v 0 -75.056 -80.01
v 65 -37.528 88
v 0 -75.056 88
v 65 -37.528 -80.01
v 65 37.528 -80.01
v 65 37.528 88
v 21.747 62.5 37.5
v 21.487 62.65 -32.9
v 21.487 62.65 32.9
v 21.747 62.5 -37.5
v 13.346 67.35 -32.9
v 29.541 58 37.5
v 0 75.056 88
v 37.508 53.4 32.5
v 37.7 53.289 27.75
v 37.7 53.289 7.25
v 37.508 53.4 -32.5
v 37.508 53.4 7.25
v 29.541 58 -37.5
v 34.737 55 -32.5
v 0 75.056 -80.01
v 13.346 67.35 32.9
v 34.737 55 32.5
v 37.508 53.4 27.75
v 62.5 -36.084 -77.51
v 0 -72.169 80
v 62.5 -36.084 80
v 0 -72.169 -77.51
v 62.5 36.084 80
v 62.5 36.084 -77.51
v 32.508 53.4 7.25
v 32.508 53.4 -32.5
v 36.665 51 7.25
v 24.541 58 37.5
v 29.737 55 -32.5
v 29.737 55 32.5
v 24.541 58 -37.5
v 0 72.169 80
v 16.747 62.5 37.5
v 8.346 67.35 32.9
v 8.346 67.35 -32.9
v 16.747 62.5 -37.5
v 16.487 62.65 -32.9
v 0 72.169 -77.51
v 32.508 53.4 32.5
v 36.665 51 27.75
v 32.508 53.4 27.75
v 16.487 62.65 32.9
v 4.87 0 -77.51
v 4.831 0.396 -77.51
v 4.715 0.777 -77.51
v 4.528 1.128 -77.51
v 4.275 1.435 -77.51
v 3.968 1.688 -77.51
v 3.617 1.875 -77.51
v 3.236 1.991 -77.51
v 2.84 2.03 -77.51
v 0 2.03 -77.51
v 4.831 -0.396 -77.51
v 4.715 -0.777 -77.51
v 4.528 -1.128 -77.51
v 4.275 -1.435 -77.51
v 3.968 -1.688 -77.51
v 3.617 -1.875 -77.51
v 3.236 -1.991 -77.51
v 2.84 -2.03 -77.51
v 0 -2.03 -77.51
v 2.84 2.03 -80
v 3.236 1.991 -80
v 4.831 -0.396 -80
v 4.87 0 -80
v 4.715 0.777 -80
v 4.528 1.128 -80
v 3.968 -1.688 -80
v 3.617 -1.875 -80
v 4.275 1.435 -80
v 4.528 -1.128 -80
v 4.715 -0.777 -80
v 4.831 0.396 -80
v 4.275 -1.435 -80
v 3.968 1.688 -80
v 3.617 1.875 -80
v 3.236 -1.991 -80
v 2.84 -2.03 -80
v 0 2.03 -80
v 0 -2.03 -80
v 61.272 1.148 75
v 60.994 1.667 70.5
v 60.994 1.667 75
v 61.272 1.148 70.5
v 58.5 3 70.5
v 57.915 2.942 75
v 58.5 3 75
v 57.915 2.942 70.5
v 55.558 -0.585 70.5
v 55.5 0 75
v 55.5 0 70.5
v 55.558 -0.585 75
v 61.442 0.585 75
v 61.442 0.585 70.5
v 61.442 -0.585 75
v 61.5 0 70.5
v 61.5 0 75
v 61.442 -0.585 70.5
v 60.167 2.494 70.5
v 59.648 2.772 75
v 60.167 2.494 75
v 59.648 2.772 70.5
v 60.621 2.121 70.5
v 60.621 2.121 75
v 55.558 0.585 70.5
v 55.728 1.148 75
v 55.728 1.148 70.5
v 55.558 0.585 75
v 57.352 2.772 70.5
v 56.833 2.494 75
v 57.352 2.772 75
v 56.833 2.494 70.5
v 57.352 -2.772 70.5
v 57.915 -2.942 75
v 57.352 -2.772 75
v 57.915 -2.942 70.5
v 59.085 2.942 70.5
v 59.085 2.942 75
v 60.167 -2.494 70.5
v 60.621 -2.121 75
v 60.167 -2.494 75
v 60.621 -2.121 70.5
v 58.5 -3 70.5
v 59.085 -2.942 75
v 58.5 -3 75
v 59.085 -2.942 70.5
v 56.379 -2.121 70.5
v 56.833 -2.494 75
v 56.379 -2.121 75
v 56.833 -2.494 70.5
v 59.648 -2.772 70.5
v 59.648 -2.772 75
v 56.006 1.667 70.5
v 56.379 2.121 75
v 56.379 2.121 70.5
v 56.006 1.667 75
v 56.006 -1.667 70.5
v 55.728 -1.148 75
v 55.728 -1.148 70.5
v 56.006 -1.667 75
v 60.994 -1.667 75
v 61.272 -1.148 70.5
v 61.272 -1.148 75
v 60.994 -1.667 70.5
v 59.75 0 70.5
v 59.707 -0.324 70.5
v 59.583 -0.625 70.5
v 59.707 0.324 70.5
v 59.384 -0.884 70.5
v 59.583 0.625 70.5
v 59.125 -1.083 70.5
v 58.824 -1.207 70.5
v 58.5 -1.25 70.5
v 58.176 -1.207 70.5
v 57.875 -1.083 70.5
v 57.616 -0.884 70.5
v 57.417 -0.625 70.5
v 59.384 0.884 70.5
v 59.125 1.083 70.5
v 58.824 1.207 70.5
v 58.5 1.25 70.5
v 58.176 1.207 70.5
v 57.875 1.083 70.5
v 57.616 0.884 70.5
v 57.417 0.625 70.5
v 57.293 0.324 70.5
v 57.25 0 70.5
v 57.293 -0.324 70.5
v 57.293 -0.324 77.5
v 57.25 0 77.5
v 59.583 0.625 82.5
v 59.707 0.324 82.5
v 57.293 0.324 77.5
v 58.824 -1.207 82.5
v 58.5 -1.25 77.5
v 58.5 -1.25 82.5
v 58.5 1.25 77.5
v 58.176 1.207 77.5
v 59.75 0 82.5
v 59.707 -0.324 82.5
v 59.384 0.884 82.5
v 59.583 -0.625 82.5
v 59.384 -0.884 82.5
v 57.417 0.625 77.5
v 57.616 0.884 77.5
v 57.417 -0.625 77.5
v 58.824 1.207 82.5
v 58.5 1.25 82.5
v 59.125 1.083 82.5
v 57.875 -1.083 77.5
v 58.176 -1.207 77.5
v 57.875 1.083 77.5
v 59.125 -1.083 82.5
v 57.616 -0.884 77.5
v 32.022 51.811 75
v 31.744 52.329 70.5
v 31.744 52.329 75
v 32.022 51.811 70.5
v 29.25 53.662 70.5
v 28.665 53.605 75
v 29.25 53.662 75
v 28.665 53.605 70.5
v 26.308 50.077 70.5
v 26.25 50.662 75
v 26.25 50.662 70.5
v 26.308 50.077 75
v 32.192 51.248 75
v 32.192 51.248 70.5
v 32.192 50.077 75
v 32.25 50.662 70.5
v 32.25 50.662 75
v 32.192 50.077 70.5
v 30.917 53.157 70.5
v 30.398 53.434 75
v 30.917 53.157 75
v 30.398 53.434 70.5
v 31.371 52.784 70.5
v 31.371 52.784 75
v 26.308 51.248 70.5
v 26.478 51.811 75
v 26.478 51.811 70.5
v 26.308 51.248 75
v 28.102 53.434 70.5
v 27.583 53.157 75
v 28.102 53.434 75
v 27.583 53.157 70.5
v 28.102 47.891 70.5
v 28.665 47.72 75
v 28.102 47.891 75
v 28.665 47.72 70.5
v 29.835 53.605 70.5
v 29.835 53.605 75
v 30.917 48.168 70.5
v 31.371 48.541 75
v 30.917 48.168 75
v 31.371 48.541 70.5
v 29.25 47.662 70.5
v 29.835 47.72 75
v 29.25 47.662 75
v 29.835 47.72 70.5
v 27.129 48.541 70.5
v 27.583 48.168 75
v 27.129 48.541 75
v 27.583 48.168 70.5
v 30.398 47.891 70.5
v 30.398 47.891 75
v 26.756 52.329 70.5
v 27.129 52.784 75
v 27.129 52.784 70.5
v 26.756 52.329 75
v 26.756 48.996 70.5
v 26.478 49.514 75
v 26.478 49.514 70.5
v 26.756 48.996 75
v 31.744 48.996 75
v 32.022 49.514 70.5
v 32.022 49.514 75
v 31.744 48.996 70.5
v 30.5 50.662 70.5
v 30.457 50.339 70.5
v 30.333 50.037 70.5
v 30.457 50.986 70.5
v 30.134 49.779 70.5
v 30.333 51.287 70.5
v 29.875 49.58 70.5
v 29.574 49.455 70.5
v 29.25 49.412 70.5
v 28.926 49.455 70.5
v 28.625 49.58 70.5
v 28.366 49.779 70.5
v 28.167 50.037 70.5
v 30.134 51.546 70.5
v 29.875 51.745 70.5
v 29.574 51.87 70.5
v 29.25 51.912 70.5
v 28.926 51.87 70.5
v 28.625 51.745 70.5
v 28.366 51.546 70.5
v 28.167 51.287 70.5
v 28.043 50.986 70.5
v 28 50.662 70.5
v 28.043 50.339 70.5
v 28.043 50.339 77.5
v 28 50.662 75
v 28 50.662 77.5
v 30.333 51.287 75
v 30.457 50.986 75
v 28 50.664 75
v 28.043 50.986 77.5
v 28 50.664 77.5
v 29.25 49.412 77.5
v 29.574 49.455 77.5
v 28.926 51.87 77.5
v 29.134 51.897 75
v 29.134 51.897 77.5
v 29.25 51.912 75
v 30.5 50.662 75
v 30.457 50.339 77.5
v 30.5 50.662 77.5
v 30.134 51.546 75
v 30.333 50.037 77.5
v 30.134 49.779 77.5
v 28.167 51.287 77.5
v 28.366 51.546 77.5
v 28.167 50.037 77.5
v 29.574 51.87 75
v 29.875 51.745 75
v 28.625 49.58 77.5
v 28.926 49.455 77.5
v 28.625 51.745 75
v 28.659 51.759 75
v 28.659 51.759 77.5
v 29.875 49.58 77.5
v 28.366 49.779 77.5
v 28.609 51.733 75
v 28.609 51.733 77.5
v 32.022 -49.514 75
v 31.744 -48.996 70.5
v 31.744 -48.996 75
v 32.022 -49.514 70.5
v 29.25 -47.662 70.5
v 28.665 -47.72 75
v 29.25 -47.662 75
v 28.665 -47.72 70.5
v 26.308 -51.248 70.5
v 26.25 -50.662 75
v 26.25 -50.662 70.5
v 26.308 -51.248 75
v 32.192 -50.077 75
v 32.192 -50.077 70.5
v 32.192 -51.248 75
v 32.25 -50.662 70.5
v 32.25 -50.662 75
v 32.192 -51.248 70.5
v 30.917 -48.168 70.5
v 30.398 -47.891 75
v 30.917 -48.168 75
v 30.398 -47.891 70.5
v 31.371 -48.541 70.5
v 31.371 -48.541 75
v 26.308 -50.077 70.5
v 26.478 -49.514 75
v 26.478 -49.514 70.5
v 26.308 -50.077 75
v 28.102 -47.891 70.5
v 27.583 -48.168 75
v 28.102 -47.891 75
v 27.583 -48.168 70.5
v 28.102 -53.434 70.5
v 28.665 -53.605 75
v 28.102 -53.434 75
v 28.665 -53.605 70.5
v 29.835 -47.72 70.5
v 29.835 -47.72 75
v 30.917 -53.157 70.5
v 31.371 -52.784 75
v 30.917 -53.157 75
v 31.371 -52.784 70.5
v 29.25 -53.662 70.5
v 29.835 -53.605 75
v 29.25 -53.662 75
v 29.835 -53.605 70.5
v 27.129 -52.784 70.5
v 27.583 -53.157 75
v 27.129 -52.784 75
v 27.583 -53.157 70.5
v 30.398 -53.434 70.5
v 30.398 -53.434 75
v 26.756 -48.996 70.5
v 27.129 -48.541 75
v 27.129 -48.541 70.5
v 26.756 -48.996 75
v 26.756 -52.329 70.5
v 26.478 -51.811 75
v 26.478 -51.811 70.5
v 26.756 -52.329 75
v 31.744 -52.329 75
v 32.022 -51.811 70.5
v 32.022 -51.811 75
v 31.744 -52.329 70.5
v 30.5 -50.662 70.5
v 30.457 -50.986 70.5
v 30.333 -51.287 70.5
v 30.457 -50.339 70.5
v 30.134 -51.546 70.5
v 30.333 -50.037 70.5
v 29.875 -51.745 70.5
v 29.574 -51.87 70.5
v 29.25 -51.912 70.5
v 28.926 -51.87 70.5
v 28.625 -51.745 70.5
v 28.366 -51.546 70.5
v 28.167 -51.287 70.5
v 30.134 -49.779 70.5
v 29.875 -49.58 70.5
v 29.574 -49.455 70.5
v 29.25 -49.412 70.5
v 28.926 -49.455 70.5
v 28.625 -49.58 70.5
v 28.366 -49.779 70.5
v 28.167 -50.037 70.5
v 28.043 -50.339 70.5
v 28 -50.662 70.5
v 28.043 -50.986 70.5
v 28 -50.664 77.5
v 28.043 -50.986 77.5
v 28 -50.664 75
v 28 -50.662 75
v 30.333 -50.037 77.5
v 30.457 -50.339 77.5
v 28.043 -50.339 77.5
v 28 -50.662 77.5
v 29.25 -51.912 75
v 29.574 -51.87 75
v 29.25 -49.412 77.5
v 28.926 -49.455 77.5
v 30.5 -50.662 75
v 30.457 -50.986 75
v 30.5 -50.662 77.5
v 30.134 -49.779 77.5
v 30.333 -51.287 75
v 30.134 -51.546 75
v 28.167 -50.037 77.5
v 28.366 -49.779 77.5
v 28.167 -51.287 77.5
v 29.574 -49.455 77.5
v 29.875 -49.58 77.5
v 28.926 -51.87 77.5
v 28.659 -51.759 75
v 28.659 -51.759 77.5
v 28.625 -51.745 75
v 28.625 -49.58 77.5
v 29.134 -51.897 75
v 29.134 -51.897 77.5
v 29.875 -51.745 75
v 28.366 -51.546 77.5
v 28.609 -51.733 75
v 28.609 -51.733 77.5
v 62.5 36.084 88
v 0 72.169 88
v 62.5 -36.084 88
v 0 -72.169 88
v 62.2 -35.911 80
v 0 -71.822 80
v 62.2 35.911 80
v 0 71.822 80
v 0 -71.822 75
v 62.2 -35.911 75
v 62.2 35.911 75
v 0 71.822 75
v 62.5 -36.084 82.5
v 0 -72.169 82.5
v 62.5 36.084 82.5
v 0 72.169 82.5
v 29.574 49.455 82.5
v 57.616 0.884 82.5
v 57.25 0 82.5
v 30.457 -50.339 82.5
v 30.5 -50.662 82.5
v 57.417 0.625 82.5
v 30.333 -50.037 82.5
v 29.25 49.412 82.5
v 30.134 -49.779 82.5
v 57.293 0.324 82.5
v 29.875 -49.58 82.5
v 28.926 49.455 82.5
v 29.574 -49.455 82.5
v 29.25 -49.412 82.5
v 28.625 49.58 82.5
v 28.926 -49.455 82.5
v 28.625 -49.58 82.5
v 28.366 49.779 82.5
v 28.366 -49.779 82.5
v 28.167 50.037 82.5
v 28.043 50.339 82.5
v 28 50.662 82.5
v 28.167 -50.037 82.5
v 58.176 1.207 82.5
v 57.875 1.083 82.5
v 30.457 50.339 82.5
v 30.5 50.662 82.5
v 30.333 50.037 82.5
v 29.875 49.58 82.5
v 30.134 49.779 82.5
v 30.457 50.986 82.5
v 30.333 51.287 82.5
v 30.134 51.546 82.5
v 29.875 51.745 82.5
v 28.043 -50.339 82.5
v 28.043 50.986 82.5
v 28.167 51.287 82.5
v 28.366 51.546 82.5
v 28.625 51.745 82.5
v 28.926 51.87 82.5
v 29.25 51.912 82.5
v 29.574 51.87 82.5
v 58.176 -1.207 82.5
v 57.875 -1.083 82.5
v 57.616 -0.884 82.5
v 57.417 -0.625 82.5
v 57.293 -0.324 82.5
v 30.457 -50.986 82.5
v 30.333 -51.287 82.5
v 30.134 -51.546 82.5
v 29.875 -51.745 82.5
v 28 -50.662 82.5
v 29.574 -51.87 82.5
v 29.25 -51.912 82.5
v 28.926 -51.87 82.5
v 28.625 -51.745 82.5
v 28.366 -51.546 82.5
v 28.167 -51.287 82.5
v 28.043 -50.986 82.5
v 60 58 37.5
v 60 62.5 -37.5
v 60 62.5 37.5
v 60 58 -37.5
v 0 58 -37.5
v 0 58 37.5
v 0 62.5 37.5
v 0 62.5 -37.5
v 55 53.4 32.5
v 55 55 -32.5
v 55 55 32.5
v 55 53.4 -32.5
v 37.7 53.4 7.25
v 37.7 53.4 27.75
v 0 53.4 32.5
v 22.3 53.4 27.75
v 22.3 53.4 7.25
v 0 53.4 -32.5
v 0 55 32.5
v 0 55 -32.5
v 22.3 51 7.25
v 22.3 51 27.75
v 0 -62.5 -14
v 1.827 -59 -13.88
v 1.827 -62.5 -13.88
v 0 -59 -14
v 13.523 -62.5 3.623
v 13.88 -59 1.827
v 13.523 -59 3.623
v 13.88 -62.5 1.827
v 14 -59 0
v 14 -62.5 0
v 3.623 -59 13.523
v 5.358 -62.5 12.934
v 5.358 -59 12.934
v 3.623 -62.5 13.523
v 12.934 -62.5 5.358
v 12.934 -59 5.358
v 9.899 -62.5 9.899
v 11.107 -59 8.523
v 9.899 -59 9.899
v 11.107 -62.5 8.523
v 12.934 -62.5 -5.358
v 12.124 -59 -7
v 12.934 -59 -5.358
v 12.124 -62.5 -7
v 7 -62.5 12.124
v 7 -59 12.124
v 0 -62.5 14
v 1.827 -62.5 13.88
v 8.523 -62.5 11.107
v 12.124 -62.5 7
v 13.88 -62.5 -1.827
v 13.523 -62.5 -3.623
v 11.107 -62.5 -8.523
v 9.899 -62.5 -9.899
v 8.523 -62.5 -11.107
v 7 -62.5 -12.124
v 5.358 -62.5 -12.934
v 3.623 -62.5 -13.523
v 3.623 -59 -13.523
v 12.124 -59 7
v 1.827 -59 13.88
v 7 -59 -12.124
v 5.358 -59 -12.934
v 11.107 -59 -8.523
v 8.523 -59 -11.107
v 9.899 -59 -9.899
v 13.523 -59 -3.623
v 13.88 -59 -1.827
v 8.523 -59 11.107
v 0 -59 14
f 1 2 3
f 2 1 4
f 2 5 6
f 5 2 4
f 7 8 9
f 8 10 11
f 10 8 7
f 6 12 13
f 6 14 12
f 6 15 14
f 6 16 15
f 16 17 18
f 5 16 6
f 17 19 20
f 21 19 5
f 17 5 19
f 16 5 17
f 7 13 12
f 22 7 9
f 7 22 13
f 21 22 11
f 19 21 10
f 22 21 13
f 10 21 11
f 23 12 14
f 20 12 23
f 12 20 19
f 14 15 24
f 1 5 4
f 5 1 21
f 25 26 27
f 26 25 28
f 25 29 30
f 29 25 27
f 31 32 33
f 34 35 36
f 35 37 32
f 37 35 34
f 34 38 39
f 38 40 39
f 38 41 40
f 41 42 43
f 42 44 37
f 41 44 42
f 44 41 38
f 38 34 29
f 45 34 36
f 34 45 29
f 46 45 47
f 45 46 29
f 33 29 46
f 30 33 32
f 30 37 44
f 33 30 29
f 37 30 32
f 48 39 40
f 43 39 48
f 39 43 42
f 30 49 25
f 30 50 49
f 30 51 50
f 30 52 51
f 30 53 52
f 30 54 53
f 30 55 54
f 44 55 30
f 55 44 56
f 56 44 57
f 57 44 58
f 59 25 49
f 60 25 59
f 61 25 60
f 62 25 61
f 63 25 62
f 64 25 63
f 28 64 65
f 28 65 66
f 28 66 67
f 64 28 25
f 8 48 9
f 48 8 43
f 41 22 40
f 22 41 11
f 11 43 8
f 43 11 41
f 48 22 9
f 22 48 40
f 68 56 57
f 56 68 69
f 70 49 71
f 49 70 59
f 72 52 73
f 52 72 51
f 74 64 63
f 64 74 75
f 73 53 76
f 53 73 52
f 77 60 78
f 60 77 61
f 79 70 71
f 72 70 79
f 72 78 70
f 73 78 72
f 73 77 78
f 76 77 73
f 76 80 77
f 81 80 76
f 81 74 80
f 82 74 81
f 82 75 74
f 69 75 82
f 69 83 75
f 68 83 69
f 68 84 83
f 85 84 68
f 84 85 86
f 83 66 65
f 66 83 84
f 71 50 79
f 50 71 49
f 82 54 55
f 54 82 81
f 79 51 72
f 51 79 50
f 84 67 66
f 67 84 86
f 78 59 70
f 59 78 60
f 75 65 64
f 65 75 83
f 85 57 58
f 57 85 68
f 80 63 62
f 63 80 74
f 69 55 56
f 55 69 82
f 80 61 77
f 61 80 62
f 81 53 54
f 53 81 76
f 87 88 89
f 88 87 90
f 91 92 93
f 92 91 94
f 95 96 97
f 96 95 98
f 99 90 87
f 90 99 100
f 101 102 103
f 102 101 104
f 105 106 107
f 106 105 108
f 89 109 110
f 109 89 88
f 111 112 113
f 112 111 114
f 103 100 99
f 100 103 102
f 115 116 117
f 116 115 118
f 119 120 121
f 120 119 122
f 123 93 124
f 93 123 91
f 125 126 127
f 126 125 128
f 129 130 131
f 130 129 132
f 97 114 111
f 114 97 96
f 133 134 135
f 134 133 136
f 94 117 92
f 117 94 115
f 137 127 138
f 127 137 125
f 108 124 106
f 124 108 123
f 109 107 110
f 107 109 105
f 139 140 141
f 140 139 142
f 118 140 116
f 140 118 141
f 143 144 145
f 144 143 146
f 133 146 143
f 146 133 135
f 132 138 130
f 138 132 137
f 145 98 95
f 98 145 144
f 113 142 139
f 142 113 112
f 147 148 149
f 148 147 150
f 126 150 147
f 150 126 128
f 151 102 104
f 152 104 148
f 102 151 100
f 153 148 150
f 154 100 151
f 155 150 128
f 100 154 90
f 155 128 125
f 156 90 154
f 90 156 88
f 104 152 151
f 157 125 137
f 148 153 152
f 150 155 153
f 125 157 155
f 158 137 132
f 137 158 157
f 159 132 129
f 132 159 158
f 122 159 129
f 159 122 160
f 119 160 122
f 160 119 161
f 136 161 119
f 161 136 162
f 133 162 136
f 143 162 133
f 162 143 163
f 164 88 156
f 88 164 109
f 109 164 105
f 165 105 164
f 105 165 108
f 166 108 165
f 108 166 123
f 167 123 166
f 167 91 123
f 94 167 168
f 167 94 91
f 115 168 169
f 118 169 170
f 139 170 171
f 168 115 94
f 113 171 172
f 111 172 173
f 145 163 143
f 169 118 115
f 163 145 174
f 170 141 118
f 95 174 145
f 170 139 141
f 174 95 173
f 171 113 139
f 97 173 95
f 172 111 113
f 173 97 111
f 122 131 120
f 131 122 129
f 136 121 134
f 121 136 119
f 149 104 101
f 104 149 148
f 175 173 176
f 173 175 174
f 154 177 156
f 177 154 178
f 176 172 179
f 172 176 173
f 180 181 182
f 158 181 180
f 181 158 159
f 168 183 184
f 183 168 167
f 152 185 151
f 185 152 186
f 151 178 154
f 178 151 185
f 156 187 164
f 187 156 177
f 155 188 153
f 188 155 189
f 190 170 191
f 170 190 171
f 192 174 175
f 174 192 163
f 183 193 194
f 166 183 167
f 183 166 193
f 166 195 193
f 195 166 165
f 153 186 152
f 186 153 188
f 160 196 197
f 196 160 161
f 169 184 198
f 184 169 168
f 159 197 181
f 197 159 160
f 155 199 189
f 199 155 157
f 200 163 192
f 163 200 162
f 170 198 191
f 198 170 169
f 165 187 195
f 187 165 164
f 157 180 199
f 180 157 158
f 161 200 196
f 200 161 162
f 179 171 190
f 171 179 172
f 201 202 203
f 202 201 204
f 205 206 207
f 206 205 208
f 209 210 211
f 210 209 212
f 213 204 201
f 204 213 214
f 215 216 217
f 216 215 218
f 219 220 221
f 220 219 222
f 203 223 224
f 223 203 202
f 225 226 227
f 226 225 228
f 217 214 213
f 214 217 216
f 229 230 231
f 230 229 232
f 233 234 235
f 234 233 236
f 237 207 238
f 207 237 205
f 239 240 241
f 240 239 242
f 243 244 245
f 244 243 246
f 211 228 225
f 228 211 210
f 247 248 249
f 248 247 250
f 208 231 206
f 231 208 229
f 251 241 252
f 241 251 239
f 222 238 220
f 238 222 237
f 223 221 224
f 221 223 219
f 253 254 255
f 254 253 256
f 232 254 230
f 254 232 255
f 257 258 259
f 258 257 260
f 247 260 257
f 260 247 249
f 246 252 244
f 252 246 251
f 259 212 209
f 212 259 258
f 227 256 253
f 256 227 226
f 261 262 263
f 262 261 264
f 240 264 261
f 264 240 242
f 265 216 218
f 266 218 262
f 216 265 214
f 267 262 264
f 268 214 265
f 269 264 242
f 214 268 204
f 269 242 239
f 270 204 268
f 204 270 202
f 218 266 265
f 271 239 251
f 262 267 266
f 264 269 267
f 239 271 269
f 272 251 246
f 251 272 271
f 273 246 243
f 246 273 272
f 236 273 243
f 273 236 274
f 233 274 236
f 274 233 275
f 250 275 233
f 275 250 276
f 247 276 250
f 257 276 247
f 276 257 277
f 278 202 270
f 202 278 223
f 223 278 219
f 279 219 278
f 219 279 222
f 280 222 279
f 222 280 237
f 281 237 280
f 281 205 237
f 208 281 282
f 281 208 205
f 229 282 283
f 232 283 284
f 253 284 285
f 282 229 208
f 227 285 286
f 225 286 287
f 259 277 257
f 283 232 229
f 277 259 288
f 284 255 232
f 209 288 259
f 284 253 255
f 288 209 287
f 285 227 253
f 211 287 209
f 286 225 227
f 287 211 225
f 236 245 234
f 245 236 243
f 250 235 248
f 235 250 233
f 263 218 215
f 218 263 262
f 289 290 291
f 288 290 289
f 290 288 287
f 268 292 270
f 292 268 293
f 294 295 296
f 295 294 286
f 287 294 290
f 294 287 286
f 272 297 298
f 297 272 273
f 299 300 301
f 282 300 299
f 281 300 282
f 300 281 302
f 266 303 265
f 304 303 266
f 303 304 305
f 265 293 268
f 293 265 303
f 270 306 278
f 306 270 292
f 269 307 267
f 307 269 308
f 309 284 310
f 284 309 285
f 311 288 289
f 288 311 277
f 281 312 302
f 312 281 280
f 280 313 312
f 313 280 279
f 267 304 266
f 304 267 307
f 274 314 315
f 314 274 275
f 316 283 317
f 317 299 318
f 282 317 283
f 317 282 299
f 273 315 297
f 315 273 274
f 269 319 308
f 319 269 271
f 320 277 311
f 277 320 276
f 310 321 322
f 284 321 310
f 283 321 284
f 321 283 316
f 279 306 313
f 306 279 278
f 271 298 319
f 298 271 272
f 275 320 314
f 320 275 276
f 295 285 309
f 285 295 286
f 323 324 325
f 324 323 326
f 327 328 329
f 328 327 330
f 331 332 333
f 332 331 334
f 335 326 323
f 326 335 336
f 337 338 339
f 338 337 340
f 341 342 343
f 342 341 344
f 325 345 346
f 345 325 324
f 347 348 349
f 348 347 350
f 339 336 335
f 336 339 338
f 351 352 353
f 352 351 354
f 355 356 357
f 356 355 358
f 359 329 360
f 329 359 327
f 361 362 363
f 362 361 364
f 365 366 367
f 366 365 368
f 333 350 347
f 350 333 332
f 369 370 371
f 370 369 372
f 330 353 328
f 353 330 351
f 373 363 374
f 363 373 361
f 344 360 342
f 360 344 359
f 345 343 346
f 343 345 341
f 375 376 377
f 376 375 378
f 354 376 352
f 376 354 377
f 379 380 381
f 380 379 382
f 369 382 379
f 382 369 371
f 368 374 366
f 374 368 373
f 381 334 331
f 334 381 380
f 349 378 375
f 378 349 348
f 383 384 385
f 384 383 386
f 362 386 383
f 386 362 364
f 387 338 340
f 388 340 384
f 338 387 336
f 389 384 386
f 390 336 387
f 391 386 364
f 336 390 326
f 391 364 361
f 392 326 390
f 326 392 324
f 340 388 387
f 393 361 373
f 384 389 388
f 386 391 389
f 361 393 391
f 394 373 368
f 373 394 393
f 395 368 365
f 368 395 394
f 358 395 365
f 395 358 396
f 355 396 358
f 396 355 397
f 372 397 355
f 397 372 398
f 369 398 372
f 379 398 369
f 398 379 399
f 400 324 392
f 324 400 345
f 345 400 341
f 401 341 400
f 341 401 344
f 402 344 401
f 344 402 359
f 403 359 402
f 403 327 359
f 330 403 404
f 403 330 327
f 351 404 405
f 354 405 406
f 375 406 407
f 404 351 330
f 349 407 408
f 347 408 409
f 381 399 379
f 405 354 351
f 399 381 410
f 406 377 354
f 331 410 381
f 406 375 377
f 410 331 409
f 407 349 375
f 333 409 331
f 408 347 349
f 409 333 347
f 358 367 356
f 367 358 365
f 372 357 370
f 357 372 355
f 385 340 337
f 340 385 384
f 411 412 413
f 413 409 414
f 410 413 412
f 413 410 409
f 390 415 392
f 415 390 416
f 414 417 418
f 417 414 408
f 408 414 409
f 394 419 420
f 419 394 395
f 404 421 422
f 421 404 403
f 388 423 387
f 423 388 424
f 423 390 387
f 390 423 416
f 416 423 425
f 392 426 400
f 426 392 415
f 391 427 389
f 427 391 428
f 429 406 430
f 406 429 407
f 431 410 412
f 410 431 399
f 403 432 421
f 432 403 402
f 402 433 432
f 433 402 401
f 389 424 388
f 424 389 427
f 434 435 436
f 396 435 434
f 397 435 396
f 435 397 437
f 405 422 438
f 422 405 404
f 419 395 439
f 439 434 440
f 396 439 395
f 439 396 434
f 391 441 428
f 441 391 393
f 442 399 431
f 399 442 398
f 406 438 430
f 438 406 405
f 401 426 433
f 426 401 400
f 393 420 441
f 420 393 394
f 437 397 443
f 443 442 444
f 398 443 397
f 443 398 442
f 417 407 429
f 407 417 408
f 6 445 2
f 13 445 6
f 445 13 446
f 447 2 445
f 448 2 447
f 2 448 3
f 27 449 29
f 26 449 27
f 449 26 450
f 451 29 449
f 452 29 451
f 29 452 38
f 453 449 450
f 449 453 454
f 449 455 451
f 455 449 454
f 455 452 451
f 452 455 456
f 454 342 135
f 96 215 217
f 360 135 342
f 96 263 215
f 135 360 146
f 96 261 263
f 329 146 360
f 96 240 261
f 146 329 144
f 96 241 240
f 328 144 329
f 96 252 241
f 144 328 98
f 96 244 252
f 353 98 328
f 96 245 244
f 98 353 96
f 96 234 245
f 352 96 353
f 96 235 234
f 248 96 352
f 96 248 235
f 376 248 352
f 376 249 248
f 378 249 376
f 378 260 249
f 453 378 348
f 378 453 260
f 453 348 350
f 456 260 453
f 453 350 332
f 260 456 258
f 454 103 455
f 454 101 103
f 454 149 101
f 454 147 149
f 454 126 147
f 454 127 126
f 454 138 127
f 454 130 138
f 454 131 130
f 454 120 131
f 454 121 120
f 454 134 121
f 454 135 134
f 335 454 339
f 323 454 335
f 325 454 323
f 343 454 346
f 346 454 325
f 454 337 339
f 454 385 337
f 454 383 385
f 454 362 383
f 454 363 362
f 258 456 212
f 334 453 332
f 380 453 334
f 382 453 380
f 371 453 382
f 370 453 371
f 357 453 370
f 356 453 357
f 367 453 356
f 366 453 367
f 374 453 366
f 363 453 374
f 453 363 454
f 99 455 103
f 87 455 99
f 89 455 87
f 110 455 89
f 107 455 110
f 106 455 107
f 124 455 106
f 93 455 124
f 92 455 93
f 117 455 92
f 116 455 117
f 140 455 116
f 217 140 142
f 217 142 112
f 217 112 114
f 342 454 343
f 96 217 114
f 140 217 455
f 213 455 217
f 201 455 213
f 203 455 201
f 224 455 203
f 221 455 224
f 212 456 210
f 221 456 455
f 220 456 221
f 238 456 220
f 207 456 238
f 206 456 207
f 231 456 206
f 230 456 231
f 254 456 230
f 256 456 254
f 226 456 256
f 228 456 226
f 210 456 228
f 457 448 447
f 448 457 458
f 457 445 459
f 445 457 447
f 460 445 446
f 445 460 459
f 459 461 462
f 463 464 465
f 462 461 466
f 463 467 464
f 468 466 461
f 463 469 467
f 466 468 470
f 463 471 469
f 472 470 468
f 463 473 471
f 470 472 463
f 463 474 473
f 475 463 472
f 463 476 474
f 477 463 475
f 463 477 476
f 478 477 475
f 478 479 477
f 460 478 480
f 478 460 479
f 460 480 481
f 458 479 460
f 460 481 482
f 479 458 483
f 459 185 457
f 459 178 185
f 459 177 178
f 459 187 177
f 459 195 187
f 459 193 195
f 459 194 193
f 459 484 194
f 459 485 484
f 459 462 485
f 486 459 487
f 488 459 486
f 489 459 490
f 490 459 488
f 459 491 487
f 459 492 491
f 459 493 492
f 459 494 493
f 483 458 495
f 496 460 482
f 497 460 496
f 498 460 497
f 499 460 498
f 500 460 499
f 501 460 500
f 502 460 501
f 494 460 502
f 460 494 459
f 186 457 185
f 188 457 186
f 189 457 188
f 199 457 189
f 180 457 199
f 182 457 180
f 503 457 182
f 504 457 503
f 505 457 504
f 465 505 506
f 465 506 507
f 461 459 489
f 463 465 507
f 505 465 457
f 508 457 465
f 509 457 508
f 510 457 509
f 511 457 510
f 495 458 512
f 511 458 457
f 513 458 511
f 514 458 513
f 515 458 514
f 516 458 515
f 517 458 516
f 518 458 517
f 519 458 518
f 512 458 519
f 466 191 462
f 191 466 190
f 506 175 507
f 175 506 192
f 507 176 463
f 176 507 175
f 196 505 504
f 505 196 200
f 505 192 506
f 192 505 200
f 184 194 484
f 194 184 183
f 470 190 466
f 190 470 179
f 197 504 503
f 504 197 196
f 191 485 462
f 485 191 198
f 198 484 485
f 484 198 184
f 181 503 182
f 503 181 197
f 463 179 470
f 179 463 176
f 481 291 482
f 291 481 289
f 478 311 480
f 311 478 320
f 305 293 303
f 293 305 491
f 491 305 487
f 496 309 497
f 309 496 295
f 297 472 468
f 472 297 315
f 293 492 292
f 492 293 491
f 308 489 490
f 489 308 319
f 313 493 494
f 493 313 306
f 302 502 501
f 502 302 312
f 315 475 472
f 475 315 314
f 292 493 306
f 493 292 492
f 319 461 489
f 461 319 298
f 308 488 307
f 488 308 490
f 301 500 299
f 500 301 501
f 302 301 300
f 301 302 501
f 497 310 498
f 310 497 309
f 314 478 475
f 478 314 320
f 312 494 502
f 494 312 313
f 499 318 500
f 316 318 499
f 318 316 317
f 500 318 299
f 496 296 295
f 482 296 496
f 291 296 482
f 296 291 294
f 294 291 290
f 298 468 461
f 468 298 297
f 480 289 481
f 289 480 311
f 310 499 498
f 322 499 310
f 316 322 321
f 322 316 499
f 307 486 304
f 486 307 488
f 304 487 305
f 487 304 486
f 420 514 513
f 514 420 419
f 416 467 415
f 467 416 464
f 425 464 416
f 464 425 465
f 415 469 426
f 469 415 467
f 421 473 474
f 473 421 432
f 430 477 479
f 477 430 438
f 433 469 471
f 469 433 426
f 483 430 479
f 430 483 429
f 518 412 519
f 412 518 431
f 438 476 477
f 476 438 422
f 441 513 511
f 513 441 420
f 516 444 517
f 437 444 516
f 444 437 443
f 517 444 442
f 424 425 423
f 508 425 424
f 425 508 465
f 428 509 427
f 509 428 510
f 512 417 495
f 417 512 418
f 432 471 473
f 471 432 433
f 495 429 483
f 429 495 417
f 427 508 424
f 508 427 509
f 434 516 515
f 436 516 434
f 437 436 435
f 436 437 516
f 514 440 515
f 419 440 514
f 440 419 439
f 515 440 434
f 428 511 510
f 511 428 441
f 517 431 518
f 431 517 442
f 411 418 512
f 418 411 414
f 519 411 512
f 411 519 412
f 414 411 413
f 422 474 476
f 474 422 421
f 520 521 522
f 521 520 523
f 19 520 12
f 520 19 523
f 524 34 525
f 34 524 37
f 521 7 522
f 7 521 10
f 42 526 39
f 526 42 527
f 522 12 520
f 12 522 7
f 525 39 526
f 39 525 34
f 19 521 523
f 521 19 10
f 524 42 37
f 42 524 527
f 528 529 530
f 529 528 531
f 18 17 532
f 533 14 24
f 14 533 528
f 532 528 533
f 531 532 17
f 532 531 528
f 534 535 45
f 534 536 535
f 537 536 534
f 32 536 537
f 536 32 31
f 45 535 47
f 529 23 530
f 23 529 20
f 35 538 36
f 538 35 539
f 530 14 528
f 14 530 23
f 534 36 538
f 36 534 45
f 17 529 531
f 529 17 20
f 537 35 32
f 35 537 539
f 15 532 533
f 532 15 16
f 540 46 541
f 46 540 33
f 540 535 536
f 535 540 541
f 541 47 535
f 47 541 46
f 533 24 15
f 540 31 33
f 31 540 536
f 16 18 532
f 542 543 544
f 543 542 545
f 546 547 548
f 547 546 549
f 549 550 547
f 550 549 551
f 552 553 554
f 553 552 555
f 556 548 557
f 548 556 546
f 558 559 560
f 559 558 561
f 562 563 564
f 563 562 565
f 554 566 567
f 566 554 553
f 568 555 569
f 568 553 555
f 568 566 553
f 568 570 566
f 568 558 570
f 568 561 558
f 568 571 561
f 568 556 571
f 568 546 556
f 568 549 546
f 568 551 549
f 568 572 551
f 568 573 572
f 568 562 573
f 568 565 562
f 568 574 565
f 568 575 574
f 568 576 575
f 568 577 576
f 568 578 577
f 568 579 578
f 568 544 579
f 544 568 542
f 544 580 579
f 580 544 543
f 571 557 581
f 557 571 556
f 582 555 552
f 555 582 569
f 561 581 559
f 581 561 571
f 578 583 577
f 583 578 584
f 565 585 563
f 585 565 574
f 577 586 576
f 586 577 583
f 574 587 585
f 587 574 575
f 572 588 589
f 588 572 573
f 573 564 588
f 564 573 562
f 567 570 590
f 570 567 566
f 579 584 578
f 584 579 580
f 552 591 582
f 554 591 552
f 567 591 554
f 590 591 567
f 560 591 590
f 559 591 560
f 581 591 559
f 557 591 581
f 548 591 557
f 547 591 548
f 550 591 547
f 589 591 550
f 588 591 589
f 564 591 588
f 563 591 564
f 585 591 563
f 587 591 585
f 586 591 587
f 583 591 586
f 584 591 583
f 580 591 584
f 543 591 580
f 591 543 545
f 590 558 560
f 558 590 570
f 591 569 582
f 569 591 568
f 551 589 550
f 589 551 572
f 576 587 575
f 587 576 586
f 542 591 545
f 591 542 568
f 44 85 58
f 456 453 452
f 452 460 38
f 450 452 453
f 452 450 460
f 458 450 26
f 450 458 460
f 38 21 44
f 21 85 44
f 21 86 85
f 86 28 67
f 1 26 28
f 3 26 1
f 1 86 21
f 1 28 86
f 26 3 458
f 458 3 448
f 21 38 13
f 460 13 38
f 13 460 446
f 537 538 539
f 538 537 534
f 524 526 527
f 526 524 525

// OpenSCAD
intersection() {
	union() {
		color(alpha = 0.9, c = "SlateGray") {
			union() {
				difference() {
					difference() {
						difference() {
							difference() {
								difference() {
									rotate(a = [0, 0, 30]) {
										cylinder($fn = 6, center = true, d = 150.1110699893027, h = 160.02);
									}
									translate(v = [0, 0, 1.25]) {
										rotate(a = [0, 0, 30]) {
											cylinder($fn = 6, center = true, d = 144.33756729740645, h = 157.52);
										}
									}
								}
								translate(v = [0, 0, 0.0]) {
									rotate(a = [0, 0, 0.0]) {
										translate(v = [0, 65.0, 0]) {
											rotate(a = [90, 0, 0]) {
												cube(center = true, size = [109.0, 65.8, 4.7]);
											}
										}
									}
								}
							}
							union() {
								translate(v = [0, 0, -15.0]) {
									rotate(a = [0, 0, -60.0]) {
										translate(v = [0, 65.0, 0]) {
											rotate(a = [90, 0, 0]) {
												cylinder($fn = 32, center = true, d = 8.0, h = 4.7);
											}
										}
									}
								}
								translate(v = [0, 0, 0.0]) {
									rotate(a = [0, 0, -60.0]) {
										translate(v = [0, 65.0, 0]) {
											rotate(a = [90, 0, 0]) {
												cylinder($fn = 32, center = true, d = 8.0, h = 4.7);
											}
										}
									}
								}
								translate(v = [0, 0, 15.0]) {
									rotate(a = [0, 0, -60.0]) {
										translate(v = [0, 65.0, 0]) {
											rotate(a = [90, 0, 0]) {
												cylinder($fn = 32, center = true, d = 8.0, h = 4.7);
											}
										}
									}
								}
							}
						}
						rotate(a = [0, 0, 120.0]) {
							translate(v = [0, 65.0, 0]) {
								rotate(a = [90, 0, 0]) {
									translate(v = [0, 0, 0]) {
										union() {
											translate(v = [-8.0, -16.0, 0]) {
												cylinder($fn = 16, center = true, d = 2.0, h = 20);
											}
											translate(v = [-4.0, -16.0, 0]) {
												cylinder($fn = 16, center = true, d = 2.0, h = 20);
											}
											translate(v = [0.0, -16.0, 0]) {
												cylinder($fn = 16, center = true, d = 2.0, h = 20);
											}
											translate(v = [4.0, -16.0, 0]) {
												cylinder($fn = 16, center = true, d = 2.0, h = 20);
											}
											translate(v = [8.0, -16.0, 0]) {
												cylinder($fn = 16, center = true, d = 2.0, h = 20);
											}
											translate(v = [-12.0, -12.0, 0]) {
												cylinder($fn = 16, center = true, d = 2.0, h = 20);
											}
											translate(v = [-8.0, -12.0, 0]) {
												cylinder($fn = 16, center = true, d = 2.0, h = 20);
											}
											translate(v = [-4.0, -12.0, 0]) {
												cylinder($fn = 16, center = true, d = 2.0, h = 20);
											}
											translate(v = [0.0, -12.0, 0]) {
												cylinder($fn = 16, center = true, d = 2.0, h = 20);
											}
											translate(v = [4.0, -12.0, 0]) {
												cylinder($fn = 16, center = true, d = 2.0, h = 20);
											}
											translate(v = [8.0, -12.0, 0]) {
												cylinder($fn = 16, center = true, d = 2.0, h = 20);
											}
											translate(v = [12.0, -12.0, 0]) {
												cylinder($fn = 16, center = true, d = 2.0, h = 20);
											}
											translate(v = [-16.0, -8.0, 0]) {
												cylinder($fn = 16, center = true, d = 2.0, h = 20);
											}
											translate(v = [-12.0, -8.0, 0]) {
												cylinder($fn = 16, center = true, d = 2.0, h = 20);
											}
											translate(v = [-8.0, -8.0, 0]) {
												cylinder($fn = 16, center = true, d = 2.0, h = 20);
											}
											translate(v = [-4.0, -8.0, 0]) {
												cylinder($fn = 16, center = true, d = 2.0, h = 20);
											}
											translate(v = [0.0, -8.0, 0]) {
												cylinder($fn = 16, center = true, d = 2.0, h = 20);
											}
											translate(v = [4.0, -8.0, 0]) {
												cylinder($fn = 16, center = true, d = 2.0, h = 20);
											}
											translate(v = [8.0, -8.0, 0]) {
												cylinder($fn = 16, center = true, d = 2.0, h = 20);
											}
											translate(v = [12.0, -8.0, 0]) {
												cylinder($fn = 16, center = true, d = 2.0, h = 20);
											}
											translate(v = [16.0, -8.0, 0]) {
												cylinder($fn = 16, center = true, d = 2.0, h = 20);
											}
											translate(v = [-16.0, -4.0, 0]) {
												cylinder($fn = 16, center = true, d = 2.0, h = 20);
											}
											translate(v = [-12.0, -4.0, 0]) {
												cylinder($fn = 16, center = true, d = 2.0, h = 20);
											}
											translate(v = [-8.0, -4.0, 0]) {
												cylinder($fn = 16, center = true, d = 2.0, h = 20);
											}
											translate(v = [-4.0, -4.0, 0]) {
												cylinder($fn = 16, center = true, d = 2.0, h = 20);
											}
											translate(v = [0.0, -4.0, 0]) {
												cylinder($fn = 16, center = true, d = 2.0, h = 20);
											}
											translate(v = [4.0, -4.0, 0]) {
												cylinder($fn = 16, center = true, d = 2.0, h = 20);
											}
											translate(v = [8.0, -4.0, 0]) {
												cylinder($fn = 16, center = true, d = 2.0, h = 20);
											}
											translate(v = [12.0, -4.0, 0]) {
												cylinder($fn = 16, center = true, d = 2.0, h = 20);
											}
											translate(v = [16.0, -4.0, 0]) {
												cylinder($fn = 16, center = true, d = 2.0, h = 20);
											}
											translate(v = [-16.0, 0.0, 0]) {
												cylinder($fn = 16, center = true, d = 2.0, h = 20);
											}
											translate(v = [-12.0, 0.0, 0]) {
												cylinder($fn = 16, center = true, d = 2.0, h = 20);
											}
											translate(v = [-8.0, 0.0, 0]) {
												cylinder($fn = 16, center = true, d = 2.0, h = 20);
											}
											translate(v = [-4.0, 0.0, 0]) {
												cylinder($fn = 16, center = true, d = 2.0, h = 20);
											}
											translate(v = [0.0, 0.0, 0]) {
												cylinder($fn = 16, center = true, d = 2.0, h = 20);
											}
											translate(v = [4.0, 0.0, 0]) {
												cylinder($fn = 16, center = true, d = 2.0, h = 20);
											}
											translate(v = [8.0, 0.0, 0]) {
												cylinder($fn = 16, center = true, d = 2.0, h = 20);
											}
											translate(v = [12.0, 0.0, 0]) {
												cylinder($fn = 16, center = true, d = 2.0, h = 20);
											}
											translate(v = [16.0, 0.0, 0]) {
												cylinder($fn = 16, center = true, d = 2.0, h = 20);
											}
											translate(v = [-16.0, 4.0, 0]) {
												cylinder($fn = 16, center = true, d = 2.0, h = 20);
											}
											translate(v = [-12.0, 4.0, 0]) {
												cylinder($fn = 16, center = true, d = 2.0, h = 20);
											}
											translate(v = [-8.0, 4.0, 0]) {
												cylinder($fn = 16, center = true, d = 2.0, h = 20);
											}
											translate(v = [-4.0, 4.0, 0]) {
												cylinder($fn = 16, center = true, d = 2.0, h = 20);
											}
											translate(v = [0.0, 4.0, 0]) {
												cylinder($fn = 16, center = true, d = 2.0, h = 20);
											}
											translate(v = [4.0, 4.0, 0]) {
												cylinder($fn = 16, center = true, d = 2.0, h = 20);
											}
											translate(v = [8.0, 4.0, 0]) {
												cylinder($fn = 16, center = true, d = 2.0, h = 20);
											}
											translate(v = [12.0, 4.0, 0]) {
												cylinder($fn = 16, center = true, d = 2.0, h = 20);
											}
											translate(v = [16.0, 4.0, 0]) {
												cylinder($fn = 16, center = true, d = 2.0, h = 20);
											}
											translate(v = [-16.0, 8.0, 0]) {
												cylinder($fn = 16, center = true, d = 2.0, h = 20);
											}
											translate(v = [-12.0, 8.0, 0]) {
												cylinder($fn = 16, center = true, d = 2.0, h = 20);
											}
											translate(v = [-8.0, 8.0, 0]) {
												cylinder($fn = 16, center = true, d = 2.0, h = 20);
											}
											translate(v = [-4.0, 8.0, 0]) {
												cylinder($fn = 16, center = true, d = 2.0, h = 20);
											}
											translate(v = [0.0, 8.0, 0]) {
												cylinder($fn = 16, center = true, d = 2.0, h = 20);
											}
											translate(v = [4.0, 8.0, 0]) {
												cylinder($fn = 16, center = true, d = 2.0, h = 20);
											}
											translate(v = [8.0, 8.0, 0]) {
												cylinder($fn = 16, center = true, d = 2.0, h = 20);
											}
											translate(v = [12.0, 8.0, 0]) {
												cylinder($fn = 16, center = true, d = 2.0, h = 20);
											}
											translate(v = [16.0, 8.0, 0]) {
												cylinder($fn = 16, center = true, d = 2.0, h = 20);
											}
											translate(v = [-12.0, 12.0, 0]) {
												cylinder($fn = 16, center = true, d = 2.0, h = 20);
											}
											translate(v = [-8.0, 12.0, 0]) {
												cylinder($fn = 16, center = true, d = 2.0, h = 20);
											}
											translate(v = [-4.0, 12.0, 0]) {
												cylinder($fn = 16, center = true, d = 2.0, h = 20);
											}
											translate(v = [0.0, 12.0, 0]) {
												cylinder($fn = 16, center = true, d = 2.0, h = 20);
											}
											translate(v = [4.0, 12.0, 0]) {
												cylinder($fn = 16, center = true, d = 2.0, h = 20);
											}
											translate(v = [8.0, 12.0, 0]) {
												cylinder($fn = 16, center = true, d = 2.0, h = 20);
											}
											translate(v = [12.0, 12.0, 0]) {
												cylinder($fn = 16, center = true, d = 2.0, h = 20);
											}
											translate(v = [-8.0, 16.0, 0]) {
												cylinder($fn = 16, center = true, d = 2.0, h = 20);
											}
											translate(v = [-4.0, 16.0, 0]) {
												cylinder($fn = 16, center = true, d = 2.0, h = 20);
											}
											translate(v = [0.0, 16.0, 0]) {
												cylinder($fn = 16, center = true, d = 2.0, h = 20);
											}
											translate(v = [4.0, 16.0, 0]) {
												cylinder($fn = 16, center = true, d = 2.0, h = 20);
											}
											translate(v = [8.0, 16.0, 0]) {
												cylinder($fn = 16, center = true, d = 2.0, h = 20);
											}
										}
									}
								}
							}
						}
					}
					translate(v = [0, 0, -78.15]) {
						linear_extrude(center = true, height = 3.7) {
							hull() {
								translate(v = [-2.84, 0]) {
									circle($fn = 32, r = 2.0300000000000002);
								}
								translate(v = [2.84, 0]) {
									circle($fn = 32, r = 2.0300000000000002);
								}
							}
						}
					}
				}
				union() {
					translate(v = [58.5, 0.0, 70.5]) {
						difference() {
							cylinder($fn = 32, center = false, d = 6.0, h = 7.0);
							translate(v = [0, 0, -0.1]) {
								cylinder($fn = 24, center = false, d = 2.5, h = 7.2);
							}
						}
					}
					translate(v = [29.250000000000007, 50.662486121389655, 70.5]) {
						difference() {
							cylinder($fn = 32, center = false, d = 6.0, h = 7.0);
							translate(v = [0, 0, -0.1]) {
								cylinder($fn = 24, center = false, d = 2.5, h = 7.2);
							}
						}
					}
					translate(v = [-29.249999999999986, 50.66248612138966, 70.5]) {
						difference() {
							cylinder($fn = 32, center = false, d = 6.0, h = 7.0);
							translate(v = [0, 0, -0.1]) {
								cylinder($fn = 24, center = false, d = 2.5, h = 7.2);
							}
						}
					}
					translate(v = [-58.5, 7.164183775012016e-15, 70.5]) {
						difference() {
							cylinder($fn = 32, center = false, d = 6.0, h = 7.0);
							translate(v = [0, 0, -0.1]) {
								cylinder($fn = 24, center = false, d = 2.5, h = 7.2);
							}
						}
					}
					translate(v = [-29.250000000000025, -50.66248612138965, 70.5]) {
						difference() {
							cylinder($fn = 32, center = false, d = 6.0, h = 7.0);
							translate(v = [0, 0, -0.1]) {
								cylinder($fn = 24, center = false, d = 2.5, h = 7.2);
							}
						}
					}
					translate(v = [29.250000000000007, -50.662486121389655, 70.5]) {
						difference() {
							cylinder($fn = 32, center = false, d = 6.0, h = 7.0);
							translate(v = [0, 0, -0.1]) {
								cylinder($fn = 24, center = false, d = 2.5, h = 7.2);
							}
						}
					}
				}
			}
		}
		color(alpha = 0.85, c = "DimGray") {
			translate(v = [0, 0, 80.0]) {
				difference() {
					difference() {
						difference() {
							difference() {
								difference() {
									difference() {
										difference() {
											union() {
												rotate(a = [0, 0, 30]) {
													cylinder($fn = 6, center = false, d = 150.1110699893027, h = 8.0);
												}
												translate(v = [0, 0, -5.0]) {
													rotate(a = [0, 0, 30]) {
														cylinder($fn = 6, center = false, d = 143.6447469743789, h = 5.02);
													}
												}
											}
											translate(v = [0, 0, 2.5]) {
												rotate(a = [0, 0, 30]) {
													cylinder($fn = 6, center = false, d = 144.33756729740645, h = 5.52);
												}
											}
										}
										translate(v = [58.5, 0.0, -5.1]) {
											cylinder($fn = 24, center = false, d = 2.5, h = 13.2);
										}
									}
									translate(v = [29.250000000000007, 50.662486121389655, -5.1]) {
										cylinder($fn = 24, center = false, d = 2.5, h = 13.2);
									}
								}
								translate(v = [-29.249999999999986, 50.66248612138966, -5.1]) {
									cylinder($fn = 24, center = false, d = 2.5, h = 13.2);
								}
							}
							translate(v = [-58.5, 7.164183775012016e-15, -5.1]) {
								cylinder($fn = 24, center = false, d = 2.5, h = 13.2);
							}
						}
						translate(v = [-29.250000000000025, -50.66248612138965, -5.1]) {
							cylinder($fn = 24, center = false, d = 2.5, h = 13.2);
						}
					}
					translate(v = [29.250000000000007, -50.662486121389655, -5.1]) {
						cylinder($fn = 24, center = false, d = 2.5, h = 13.2);
					}
				}
			}
		}
		translate(v = [0, 60.25, 0.0]) {
			rotate(a = [90, 0, 0]) {
				union() {
					color(alpha = 0.5, c = "DodgerBlue") {
						cube(center = true, size = [120.0, 75.0, 4.5]);
					}
					color(alpha = 0.7, c = "LightBlue") {
						translate(v = [0, 0, 1.75]) {
							cube(center = true, size = [108.0, 64.8, 1.0]);
						}
					}
				}
			}
		}
		translate(v = [0, 54.2, 0]) {
			rotate(a = [90, 0, 0]) {
				union() {
					color(alpha = 0.5, c = "ForestGreen") {
						cube(center = true, size = [110.0, 65.0, 1.6]);
					}
					color(alpha = 0.6, c = "DarkGreen") {
						translate(v = [30.0, 17.5, 2.0]) {
							cube(center = true, size = [15.4, 20.5, 2.4]);
						}
					}
				}
			}
		}
		translate(v = [0, -60.75, 0]) {
			rotate(a = [90, 0, 0]) {
				color(alpha = 0.5, c = "Gold") {
					cylinder($fn = 48, center = true, d = 28.0, h = 3.5);
				}
			}
		}
	}
	translate(v = [250.0, 0, 0]) {
		cube(center = true, size = [500, 1000, 1000]);
	}
}
